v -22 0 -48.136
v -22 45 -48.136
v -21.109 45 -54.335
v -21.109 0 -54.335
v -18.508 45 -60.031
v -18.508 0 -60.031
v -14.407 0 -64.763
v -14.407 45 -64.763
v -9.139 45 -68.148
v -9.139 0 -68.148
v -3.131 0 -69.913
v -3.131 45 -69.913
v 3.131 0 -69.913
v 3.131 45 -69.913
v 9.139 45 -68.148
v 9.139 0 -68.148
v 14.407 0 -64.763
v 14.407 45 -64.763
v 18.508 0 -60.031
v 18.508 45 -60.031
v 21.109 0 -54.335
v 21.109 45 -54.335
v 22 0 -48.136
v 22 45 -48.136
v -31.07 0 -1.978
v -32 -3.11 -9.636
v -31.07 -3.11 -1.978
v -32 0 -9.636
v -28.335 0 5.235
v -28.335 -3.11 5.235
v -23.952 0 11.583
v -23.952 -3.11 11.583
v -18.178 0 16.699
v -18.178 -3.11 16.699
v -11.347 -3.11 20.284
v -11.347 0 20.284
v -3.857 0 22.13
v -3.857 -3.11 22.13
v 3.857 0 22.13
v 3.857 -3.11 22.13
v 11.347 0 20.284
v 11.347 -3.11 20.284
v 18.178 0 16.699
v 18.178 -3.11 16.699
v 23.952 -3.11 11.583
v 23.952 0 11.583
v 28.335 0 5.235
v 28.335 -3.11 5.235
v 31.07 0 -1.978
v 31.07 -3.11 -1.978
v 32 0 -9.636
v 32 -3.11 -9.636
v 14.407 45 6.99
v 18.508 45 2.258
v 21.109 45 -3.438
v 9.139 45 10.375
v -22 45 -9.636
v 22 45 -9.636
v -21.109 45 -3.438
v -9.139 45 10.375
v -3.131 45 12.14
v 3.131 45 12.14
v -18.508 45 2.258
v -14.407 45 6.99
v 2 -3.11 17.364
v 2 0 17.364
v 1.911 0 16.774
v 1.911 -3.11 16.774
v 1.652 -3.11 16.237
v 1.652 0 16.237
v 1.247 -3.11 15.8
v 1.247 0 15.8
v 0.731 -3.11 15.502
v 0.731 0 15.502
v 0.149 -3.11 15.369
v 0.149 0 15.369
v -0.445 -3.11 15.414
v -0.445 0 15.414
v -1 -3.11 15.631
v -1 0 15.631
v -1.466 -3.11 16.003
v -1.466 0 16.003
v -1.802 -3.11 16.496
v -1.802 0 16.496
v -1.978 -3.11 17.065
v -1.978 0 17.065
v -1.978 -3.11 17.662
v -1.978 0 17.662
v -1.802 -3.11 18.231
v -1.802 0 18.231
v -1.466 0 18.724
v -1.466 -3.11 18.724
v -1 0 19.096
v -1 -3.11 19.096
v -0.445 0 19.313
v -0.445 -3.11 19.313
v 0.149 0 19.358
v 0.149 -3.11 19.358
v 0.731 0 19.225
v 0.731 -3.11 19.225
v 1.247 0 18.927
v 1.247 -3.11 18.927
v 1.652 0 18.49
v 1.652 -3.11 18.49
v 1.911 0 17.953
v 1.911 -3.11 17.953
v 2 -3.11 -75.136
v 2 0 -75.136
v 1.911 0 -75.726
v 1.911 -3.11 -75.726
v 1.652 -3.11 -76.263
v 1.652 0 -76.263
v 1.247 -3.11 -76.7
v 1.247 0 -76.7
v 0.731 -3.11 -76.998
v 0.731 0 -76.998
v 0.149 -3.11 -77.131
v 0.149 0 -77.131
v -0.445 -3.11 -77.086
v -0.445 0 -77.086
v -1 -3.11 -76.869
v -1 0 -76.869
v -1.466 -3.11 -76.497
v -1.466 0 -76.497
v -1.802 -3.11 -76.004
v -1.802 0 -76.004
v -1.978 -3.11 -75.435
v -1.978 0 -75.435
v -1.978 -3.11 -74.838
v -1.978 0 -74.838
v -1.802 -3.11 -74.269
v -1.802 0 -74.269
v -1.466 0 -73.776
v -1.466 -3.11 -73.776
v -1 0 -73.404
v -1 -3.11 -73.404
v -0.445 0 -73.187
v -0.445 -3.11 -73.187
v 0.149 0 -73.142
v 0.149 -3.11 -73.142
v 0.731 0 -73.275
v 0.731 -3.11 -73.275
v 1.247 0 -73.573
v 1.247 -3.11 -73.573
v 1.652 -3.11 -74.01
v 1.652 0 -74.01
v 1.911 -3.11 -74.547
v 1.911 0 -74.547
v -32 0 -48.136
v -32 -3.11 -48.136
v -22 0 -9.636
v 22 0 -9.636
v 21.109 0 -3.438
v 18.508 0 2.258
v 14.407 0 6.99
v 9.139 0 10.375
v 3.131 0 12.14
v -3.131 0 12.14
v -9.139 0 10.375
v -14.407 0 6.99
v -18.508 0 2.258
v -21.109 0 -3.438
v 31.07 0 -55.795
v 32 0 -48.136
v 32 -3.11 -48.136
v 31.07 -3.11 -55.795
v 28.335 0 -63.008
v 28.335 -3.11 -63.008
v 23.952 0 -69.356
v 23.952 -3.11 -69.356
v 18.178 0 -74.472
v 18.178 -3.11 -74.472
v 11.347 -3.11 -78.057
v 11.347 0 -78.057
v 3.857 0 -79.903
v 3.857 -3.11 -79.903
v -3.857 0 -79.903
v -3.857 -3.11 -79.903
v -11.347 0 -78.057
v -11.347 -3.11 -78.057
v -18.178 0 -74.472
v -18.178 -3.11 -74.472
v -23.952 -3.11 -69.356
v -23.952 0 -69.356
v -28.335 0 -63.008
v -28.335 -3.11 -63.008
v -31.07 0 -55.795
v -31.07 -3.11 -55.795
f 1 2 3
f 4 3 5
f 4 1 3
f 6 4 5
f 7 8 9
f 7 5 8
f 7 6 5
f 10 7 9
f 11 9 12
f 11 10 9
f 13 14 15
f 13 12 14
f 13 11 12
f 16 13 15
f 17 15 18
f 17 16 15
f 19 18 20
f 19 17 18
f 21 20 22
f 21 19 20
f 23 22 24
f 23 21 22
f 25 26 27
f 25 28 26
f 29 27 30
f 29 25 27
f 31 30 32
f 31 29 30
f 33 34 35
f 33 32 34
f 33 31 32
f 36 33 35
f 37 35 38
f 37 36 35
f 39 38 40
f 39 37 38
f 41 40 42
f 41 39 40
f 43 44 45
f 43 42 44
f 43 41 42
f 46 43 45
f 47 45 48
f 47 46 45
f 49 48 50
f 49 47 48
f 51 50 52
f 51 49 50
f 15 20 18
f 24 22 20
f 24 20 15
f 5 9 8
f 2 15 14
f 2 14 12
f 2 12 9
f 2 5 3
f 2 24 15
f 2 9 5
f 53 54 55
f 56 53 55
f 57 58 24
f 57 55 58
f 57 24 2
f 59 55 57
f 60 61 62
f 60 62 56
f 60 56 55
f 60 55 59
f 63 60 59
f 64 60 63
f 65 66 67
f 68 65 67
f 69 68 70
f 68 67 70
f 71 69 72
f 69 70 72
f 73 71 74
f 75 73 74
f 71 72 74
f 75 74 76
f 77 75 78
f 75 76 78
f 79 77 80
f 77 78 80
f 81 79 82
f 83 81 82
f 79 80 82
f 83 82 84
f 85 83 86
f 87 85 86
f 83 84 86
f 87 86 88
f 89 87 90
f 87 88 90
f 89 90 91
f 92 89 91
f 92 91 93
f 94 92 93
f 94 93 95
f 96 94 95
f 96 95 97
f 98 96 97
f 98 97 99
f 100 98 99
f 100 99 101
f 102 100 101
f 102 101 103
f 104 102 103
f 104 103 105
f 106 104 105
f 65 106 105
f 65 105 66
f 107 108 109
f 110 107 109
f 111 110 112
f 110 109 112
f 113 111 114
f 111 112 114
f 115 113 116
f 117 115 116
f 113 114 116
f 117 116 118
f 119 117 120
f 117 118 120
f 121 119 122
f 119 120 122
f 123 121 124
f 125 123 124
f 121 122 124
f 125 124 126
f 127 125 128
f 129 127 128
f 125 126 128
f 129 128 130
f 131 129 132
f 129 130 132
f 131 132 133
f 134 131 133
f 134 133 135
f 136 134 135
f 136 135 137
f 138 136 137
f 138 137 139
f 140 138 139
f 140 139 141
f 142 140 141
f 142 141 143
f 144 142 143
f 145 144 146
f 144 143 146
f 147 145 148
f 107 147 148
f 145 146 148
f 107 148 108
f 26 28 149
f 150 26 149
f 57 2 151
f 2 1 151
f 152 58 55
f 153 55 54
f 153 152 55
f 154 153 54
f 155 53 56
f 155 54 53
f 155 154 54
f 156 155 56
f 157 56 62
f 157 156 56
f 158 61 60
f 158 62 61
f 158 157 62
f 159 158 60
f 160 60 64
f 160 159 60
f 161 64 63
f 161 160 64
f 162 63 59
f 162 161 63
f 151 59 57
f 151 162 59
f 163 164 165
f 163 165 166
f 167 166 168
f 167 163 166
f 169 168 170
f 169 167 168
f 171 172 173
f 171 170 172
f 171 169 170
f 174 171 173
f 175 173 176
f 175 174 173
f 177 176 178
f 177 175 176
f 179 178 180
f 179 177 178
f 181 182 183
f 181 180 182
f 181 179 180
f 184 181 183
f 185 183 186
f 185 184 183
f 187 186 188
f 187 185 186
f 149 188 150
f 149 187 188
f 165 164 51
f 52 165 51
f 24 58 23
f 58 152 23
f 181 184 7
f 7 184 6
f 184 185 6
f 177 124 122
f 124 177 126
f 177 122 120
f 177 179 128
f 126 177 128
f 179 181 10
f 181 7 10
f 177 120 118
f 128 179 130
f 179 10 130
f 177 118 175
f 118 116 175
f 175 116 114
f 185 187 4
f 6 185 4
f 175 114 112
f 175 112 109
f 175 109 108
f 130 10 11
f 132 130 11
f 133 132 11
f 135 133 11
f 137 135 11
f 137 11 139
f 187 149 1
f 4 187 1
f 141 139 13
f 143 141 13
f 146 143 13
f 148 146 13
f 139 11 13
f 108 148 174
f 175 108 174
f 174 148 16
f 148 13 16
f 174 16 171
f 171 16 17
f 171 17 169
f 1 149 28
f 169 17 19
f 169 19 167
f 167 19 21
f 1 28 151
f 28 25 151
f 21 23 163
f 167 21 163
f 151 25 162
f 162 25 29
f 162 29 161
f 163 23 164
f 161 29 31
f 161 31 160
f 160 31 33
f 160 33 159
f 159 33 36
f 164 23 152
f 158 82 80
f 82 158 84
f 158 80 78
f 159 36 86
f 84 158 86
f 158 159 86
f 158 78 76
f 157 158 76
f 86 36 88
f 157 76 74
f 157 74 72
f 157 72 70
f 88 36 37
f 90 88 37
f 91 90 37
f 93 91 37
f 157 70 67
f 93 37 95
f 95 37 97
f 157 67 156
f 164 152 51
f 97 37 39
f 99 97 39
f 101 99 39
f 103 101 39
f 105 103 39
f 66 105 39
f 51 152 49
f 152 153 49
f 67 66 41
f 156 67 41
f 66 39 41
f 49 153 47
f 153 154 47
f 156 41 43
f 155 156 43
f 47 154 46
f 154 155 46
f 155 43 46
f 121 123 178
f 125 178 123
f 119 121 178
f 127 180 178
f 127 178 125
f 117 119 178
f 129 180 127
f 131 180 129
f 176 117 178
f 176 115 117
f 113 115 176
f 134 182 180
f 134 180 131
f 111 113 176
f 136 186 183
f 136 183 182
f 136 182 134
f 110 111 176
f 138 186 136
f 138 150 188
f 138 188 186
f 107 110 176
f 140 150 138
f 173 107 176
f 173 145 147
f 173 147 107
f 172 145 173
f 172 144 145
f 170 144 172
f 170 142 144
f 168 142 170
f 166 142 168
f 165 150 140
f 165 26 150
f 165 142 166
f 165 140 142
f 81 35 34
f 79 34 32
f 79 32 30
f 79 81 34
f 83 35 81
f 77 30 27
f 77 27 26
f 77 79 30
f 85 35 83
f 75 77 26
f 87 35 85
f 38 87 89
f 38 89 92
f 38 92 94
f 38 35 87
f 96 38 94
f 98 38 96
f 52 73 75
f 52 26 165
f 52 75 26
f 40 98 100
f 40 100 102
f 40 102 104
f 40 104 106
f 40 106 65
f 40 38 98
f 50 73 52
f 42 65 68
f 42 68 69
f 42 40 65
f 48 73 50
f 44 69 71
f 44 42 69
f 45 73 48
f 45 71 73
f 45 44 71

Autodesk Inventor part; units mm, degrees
ref_plane "YZ Plane" through (0, 0, 0) normal (1, 0, 0) x (0, 1, 0)
ref_plane "XZ Plane" through (0, 0, 0) normal (0, 1, 0) x (-1, 0, 0)
ref_plane "XY Plane" through (0, 0, 0) normal (0, 0, 1) x (1, 0, 0)
sketch "Sketch1" plane through (0, 0, 0) normal (0, 1, 0) x (-1, 0, 0)
  line L0 (0, 12.3635) -> (0, -70.1365) construction
  line L1 (-22, -9.6365) -> (-22, -48.1365)
  line L2 (22, -48.1365) -> (22, -9.6365)
  arc A0 (22, -9.6365) -> (-22, -9.6365) centre (0, -9.6365) ccw
  arc A1 (-22, -48.1365) -> (22, -48.1365) centre (0, -48.1365) ccw
  point P0 (0, 0)
  point P1 (0, -28.8865)
  dimension "d0" = 82.5
  dimension "d1" = 44
extrude "Extrusion1" add sketch "Sketch1" along normal blind 45
sketch "Sketch2" plane through (0, 0, 0) normal (0, -1, 0) x (1, 0, 0)
  arc A0 (22, -9.6365) -> (-22, -9.6365) centre (0, -9.6365) ccw projected
  line L0 (0, 12.3635) -> (0, -70.1365)
  arc A1 (-22, -48.1365) -> (22, -48.1365) centre (0, -48.1365) ccw projected
  line L1 (0, -28.8865) -> (22, -28.8865) construction
  line L2 (0, 22.3635) -> (0, -80.1365) construction
  line L3 (-32, -9.6365) -> (-32, -48.1365)
  line L4 (32, -48.1365) -> (32, -9.6365)
  arc A2 (32, -9.6365) -> (-32, -9.6365) centre (0, -9.6365) ccw
  arc A3 (-32, -48.1365) -> (32, -48.1365) centre (0, -48.1365) ccw
  line L5 (22, -9.6365) -> (22, -48.1365) projected
  line L6 (-22, -48.1365) -> (-22, -9.6365) projected
  point P0 (0, 0)
  point P1 (8.1717, -6.5277)
  point P2 (0, -80.1365)
  point P3 (0, 22.3635)
  point P4 (0, -70.1365)
  dimension "d8" = 10
  dimension "d9" = 10
  dimension "d10" = 10
extrude "Extrusion2" add sketch "Sketch2" along normal blind 3.11 contours L5 A1 L0 A0 | L0 A1 L6 A0 | A2 L4 A3 L3
sketch "Sketch3" plane through (0, 0, 0) normal (0, 1, 0) x (1, 0, 0)
  circle A0 centre (0, -17.3635) radius 2
  arc A1 (-22, 9.6365) -> (22, 9.6365) centre (0, 9.6365) ccw projected
  line L0 (-32, 9.6365) -> (-32, 48.1365) projected
  line L1 (-32, 28.8865) -> (32, 28.8865) construction
  line L2 (32, 48.1365) -> (32, 9.6365) projected
  circle A2 centre (0, 75.1365) radius 2
  point P0 (0, 0)
  point P1 (0, -12.3635)
  dimension "d13" = 4
  dimension "d14" = 5
extrude "Extrusion3" cut sketch "Sketch3" against normal blind 7.7
properties part number "FabLabPlugwithbottom"
